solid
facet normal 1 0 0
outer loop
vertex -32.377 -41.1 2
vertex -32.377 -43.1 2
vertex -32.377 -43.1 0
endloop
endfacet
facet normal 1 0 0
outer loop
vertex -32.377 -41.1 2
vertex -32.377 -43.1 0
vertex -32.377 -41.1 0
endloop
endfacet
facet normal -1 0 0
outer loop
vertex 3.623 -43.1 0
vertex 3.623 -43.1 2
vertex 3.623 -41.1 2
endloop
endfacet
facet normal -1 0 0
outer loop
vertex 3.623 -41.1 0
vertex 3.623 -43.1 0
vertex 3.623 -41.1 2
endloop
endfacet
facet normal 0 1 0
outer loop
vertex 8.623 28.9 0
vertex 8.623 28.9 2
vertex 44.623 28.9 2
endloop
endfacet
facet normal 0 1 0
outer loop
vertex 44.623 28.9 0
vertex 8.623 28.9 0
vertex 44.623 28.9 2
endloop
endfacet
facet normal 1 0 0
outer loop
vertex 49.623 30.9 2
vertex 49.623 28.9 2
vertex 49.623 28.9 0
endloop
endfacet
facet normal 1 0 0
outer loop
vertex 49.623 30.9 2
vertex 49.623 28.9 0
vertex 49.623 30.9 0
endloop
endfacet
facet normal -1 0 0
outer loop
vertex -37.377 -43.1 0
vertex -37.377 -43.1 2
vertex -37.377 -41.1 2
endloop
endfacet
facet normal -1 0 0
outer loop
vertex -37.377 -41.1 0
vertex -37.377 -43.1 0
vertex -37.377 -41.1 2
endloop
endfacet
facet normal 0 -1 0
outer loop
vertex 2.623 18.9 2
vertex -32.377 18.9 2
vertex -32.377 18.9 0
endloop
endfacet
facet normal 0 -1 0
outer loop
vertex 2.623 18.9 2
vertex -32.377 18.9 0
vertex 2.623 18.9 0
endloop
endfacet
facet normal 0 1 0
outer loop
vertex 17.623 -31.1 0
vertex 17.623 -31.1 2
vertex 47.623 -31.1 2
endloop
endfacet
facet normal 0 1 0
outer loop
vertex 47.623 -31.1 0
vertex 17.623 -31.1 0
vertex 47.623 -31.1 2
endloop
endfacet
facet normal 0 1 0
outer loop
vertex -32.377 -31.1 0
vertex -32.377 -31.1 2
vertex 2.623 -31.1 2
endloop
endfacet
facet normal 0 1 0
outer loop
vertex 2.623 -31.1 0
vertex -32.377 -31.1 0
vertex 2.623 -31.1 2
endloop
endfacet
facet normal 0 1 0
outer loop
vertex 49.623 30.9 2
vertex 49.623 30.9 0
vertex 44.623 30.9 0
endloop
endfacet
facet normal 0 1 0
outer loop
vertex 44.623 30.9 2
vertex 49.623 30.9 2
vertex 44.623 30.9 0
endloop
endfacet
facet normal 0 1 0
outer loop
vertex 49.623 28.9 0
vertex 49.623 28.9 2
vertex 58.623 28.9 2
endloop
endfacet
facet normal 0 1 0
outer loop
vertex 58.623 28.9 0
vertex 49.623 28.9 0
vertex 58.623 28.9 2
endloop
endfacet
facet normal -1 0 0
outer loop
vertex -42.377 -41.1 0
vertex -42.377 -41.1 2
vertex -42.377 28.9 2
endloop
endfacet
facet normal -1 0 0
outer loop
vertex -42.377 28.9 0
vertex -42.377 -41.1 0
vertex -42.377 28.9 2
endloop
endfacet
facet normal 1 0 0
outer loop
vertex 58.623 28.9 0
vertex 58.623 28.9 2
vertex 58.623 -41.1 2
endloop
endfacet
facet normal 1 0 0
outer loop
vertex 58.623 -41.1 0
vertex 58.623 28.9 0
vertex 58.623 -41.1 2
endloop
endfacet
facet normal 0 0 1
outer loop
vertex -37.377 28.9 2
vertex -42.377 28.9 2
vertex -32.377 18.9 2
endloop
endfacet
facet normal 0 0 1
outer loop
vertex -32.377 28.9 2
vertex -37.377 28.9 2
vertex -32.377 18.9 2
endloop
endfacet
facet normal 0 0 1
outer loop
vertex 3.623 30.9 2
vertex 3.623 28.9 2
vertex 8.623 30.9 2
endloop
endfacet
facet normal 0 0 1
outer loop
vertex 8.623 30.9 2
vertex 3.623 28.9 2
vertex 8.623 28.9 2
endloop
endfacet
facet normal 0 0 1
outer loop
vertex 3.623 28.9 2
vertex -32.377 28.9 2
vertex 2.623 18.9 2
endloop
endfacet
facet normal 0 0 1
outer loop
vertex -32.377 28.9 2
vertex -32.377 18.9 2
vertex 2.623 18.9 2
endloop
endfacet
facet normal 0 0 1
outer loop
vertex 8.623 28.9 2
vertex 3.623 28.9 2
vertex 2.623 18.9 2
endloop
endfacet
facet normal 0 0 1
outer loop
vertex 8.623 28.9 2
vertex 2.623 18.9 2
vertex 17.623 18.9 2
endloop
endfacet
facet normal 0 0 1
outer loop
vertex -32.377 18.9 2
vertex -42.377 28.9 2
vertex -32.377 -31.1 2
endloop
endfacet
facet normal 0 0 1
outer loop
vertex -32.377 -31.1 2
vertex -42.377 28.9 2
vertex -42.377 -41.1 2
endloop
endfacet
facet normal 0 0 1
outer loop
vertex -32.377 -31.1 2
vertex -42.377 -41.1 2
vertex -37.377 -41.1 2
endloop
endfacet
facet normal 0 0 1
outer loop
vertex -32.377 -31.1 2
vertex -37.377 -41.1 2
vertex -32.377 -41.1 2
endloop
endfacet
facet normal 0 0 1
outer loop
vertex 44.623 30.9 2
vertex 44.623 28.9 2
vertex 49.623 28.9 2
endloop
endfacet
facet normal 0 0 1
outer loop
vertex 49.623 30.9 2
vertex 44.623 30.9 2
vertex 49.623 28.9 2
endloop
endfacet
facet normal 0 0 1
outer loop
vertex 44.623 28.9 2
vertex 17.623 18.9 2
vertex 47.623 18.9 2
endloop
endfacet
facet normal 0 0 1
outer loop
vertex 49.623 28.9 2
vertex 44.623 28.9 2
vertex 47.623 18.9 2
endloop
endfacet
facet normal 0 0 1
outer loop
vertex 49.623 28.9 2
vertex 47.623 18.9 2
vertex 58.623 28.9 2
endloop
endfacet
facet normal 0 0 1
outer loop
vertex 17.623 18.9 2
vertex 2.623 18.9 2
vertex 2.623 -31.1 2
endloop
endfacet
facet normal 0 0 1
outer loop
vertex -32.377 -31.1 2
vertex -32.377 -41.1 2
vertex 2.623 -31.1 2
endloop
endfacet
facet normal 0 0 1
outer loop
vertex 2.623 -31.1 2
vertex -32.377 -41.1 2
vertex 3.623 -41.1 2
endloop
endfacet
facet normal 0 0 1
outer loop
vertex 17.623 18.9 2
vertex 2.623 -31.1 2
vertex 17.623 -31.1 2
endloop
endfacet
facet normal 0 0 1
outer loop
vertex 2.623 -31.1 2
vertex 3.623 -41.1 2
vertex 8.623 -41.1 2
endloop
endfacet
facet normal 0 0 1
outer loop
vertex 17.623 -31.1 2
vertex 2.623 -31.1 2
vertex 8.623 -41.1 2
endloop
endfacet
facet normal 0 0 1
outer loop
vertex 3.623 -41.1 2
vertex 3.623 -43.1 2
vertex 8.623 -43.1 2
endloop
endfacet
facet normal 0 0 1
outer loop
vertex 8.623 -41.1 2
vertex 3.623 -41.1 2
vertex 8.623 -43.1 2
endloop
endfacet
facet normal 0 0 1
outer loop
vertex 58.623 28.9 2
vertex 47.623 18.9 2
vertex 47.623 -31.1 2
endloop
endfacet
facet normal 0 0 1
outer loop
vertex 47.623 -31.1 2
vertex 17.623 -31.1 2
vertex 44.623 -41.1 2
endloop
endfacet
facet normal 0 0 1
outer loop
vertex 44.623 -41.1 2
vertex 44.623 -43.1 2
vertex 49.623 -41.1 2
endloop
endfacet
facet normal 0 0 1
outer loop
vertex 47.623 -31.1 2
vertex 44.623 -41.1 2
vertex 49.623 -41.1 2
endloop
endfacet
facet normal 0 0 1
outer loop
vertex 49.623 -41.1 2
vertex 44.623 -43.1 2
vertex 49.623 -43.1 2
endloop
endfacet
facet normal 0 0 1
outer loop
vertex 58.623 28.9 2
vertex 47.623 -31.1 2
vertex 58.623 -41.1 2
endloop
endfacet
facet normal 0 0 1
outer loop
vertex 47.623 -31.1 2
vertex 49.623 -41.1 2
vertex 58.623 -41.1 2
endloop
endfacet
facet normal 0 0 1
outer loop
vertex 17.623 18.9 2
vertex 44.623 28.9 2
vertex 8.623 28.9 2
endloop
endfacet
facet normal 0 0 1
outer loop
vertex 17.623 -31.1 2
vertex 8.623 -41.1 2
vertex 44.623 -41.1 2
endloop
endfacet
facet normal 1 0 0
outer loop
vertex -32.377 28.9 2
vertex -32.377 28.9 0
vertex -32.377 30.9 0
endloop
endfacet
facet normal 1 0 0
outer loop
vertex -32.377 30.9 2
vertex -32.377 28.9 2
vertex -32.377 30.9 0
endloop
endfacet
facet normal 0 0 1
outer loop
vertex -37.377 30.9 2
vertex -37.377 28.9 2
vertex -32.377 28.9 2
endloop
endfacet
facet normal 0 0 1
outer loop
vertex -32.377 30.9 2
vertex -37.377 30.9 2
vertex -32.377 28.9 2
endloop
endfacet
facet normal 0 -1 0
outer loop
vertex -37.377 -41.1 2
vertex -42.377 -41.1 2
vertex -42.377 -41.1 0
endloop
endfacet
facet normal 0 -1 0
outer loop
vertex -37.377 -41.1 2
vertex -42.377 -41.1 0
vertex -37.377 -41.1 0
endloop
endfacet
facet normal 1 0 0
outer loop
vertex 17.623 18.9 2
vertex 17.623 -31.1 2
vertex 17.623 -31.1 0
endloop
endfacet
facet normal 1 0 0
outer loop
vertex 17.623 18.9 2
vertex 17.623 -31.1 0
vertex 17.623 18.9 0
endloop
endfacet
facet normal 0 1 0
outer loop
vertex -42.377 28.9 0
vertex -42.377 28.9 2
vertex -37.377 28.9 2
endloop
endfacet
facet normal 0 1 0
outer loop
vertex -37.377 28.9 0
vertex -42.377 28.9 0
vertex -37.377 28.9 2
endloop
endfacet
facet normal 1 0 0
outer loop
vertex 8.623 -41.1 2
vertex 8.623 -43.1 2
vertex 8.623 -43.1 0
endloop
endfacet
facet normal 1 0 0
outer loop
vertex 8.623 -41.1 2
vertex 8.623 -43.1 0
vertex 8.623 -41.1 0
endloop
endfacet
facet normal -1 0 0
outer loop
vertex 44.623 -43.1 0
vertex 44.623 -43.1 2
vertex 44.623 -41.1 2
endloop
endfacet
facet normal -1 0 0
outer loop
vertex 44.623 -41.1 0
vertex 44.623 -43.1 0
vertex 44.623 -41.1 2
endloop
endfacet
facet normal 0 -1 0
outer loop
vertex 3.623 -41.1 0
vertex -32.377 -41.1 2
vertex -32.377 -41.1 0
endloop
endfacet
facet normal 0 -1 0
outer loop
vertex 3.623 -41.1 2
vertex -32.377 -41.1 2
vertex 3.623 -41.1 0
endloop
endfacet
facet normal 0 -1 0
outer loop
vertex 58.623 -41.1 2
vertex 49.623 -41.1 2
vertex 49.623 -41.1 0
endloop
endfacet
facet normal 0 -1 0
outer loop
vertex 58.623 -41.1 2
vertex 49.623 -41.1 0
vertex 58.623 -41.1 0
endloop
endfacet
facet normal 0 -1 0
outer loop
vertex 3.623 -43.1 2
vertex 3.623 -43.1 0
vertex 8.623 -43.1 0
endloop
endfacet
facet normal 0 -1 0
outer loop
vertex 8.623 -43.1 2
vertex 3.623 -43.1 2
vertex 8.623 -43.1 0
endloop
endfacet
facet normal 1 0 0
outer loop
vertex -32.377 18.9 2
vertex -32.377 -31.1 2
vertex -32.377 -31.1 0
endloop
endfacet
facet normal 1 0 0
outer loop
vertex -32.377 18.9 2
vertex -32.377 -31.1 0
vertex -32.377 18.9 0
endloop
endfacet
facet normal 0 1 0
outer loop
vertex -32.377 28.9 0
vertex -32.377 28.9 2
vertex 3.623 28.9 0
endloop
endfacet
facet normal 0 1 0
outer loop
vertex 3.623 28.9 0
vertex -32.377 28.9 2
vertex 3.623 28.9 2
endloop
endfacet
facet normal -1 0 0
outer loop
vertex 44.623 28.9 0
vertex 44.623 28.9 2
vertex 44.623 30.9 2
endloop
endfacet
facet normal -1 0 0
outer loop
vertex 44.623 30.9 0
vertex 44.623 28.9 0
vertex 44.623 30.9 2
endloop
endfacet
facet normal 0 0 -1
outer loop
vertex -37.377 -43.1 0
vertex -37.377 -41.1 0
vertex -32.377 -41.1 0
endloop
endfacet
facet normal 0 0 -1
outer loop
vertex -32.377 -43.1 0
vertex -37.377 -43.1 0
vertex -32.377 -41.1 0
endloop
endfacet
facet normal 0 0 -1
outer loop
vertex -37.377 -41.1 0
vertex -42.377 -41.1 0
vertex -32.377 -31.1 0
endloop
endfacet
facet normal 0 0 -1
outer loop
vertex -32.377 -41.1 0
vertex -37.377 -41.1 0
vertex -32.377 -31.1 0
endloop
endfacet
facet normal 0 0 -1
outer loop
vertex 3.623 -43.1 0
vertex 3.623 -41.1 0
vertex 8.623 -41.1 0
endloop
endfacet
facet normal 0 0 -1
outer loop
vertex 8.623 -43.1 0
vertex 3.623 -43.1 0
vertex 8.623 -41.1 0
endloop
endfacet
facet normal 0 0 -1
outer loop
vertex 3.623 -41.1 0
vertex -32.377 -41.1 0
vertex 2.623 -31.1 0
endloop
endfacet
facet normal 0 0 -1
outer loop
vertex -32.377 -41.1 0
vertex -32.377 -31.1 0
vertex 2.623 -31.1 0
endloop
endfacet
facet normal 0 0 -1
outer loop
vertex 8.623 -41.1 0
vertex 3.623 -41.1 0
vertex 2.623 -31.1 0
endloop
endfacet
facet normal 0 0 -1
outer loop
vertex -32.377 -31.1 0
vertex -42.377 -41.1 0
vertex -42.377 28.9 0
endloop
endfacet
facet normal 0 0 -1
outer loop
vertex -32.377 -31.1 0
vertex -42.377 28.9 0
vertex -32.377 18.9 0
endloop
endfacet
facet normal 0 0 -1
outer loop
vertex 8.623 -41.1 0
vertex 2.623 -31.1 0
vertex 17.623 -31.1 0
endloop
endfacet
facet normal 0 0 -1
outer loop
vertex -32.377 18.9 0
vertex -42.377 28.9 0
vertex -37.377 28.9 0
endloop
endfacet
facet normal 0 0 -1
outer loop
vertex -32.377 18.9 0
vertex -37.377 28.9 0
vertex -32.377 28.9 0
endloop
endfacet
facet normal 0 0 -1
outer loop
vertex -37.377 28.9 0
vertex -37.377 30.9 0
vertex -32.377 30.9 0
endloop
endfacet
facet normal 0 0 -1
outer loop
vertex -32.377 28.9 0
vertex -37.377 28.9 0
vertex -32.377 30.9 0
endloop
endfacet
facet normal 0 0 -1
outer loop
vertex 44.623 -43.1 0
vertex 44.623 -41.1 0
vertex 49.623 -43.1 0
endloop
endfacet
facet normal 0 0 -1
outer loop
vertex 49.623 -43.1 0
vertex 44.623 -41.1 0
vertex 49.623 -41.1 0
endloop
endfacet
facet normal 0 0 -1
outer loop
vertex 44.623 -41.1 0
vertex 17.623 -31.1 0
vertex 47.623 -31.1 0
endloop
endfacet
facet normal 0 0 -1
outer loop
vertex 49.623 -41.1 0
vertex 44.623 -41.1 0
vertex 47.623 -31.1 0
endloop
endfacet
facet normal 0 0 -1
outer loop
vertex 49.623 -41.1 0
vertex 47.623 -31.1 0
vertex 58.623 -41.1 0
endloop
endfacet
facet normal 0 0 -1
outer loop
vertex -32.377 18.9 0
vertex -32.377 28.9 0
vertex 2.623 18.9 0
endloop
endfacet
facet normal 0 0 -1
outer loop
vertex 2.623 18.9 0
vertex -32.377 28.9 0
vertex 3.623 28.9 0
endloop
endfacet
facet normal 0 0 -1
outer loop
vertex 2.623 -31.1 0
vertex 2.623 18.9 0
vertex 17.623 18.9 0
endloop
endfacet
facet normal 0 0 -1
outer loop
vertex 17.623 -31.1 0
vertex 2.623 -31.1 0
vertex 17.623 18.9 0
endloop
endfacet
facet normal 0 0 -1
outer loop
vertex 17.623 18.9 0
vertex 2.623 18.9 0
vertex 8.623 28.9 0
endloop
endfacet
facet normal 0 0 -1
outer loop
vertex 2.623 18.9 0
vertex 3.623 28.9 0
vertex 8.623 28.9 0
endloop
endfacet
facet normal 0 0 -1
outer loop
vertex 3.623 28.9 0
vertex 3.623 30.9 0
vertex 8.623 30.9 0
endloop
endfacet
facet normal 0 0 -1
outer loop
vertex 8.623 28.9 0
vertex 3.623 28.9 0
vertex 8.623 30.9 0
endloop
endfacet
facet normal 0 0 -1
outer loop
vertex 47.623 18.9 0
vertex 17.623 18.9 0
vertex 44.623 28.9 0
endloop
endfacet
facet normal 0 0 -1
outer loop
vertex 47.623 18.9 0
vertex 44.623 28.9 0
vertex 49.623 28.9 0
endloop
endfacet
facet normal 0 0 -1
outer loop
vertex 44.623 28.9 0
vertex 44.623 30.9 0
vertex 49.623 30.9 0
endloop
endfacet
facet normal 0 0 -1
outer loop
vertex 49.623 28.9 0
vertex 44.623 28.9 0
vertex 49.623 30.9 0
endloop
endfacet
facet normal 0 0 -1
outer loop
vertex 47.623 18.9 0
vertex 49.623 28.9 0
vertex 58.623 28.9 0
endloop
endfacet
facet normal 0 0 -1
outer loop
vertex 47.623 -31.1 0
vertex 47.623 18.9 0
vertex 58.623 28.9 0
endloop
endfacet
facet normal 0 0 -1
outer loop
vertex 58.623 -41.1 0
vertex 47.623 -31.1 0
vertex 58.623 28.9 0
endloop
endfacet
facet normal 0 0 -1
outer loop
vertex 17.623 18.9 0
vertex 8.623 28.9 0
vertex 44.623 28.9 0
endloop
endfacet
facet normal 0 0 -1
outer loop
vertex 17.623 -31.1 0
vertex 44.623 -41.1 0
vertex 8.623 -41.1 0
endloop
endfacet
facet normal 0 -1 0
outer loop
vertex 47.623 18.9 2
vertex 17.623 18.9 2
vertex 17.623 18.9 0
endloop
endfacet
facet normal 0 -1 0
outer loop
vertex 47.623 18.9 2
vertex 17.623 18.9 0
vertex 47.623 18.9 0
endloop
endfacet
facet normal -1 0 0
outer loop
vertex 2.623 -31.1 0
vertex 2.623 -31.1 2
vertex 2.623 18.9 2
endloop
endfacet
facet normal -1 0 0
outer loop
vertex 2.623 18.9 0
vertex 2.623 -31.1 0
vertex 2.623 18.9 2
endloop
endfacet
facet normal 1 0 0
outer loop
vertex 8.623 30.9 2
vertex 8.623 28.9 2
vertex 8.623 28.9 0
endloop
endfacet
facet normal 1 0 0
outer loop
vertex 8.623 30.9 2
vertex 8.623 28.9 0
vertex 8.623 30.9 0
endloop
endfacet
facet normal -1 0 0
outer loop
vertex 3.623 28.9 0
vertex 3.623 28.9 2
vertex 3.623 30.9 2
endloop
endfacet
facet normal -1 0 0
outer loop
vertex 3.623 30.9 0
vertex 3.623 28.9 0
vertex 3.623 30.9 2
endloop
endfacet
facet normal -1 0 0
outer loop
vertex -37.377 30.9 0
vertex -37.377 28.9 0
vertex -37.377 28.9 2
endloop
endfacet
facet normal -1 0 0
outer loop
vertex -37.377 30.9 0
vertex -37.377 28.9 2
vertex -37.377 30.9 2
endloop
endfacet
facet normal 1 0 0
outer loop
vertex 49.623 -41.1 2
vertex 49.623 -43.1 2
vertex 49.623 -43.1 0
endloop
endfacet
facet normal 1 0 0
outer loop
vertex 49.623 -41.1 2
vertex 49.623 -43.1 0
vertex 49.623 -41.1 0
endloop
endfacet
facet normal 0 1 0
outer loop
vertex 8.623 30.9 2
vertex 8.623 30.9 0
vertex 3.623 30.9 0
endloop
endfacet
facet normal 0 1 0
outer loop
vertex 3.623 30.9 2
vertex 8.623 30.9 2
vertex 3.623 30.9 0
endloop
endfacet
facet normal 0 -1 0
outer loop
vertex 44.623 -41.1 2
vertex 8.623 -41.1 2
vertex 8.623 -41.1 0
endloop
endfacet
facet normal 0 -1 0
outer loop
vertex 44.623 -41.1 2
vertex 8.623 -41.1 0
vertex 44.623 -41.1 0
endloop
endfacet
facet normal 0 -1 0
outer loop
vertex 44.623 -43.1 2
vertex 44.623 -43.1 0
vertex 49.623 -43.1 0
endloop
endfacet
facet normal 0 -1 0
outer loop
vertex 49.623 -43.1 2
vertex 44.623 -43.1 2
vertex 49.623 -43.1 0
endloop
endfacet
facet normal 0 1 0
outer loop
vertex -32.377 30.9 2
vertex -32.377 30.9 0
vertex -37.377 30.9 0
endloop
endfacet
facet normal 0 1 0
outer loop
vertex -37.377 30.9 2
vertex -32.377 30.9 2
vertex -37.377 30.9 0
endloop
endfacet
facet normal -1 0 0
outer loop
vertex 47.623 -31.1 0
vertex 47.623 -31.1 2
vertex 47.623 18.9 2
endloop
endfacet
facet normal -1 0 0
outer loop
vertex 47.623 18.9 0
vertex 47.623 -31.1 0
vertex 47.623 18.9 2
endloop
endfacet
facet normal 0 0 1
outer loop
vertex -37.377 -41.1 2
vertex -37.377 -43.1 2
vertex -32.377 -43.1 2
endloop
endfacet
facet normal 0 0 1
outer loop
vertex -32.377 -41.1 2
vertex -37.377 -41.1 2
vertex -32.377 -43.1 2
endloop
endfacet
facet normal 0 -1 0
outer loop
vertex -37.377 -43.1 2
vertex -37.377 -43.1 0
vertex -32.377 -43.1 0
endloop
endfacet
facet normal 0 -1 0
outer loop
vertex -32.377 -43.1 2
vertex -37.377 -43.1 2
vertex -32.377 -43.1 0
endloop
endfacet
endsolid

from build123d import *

# Parameters (mm, degrees)
F0_W      = 101
F0_H      = 2
F1_DEPTH  = 12
F0_H_2    = 70
F2_DEPTH  = 2
F4_R      = 1.75
F5_DEPTH  = 100
F3_W      = 48
F3_H      = 12
F6_DEPTH  = 2
F7_W      = 35
F7_H      = 50
F7_W_2    = 30
F8_DEPTH  = 2
F9_W      = 5
F9_H      = 10
F10_DEPTH = 80
F11_DEPTH = 12


with BuildPart() as f1:
    # F0 (on Top) → F1 (new body)
    with BuildSketch(Plane.XY):
        Polygon((-42.3766899407, -41.0996641517), (-42.3766899407, 28.9003358483), (-42.3766899407, 30.9003358483), (-44.3766899407, 30.9003358483), (-44.3766899407, -43.0996641517), (-42.3766899407, -43.0996641517), align=None)
        with Locations((8.1233100593, 29.9003358483)):
            Rectangle(F0_W, F0_H)
        Polygon((58.6233100593, 30.9003358483), (58.6233100593, 28.9003358483), (58.6233100593, -41.0996641517), (58.6233100593, -43.0996641517), (60.6233100593, -43.0996641517), (60.6233100593, 30.9003358483), align=None)
        with Locations((8.1233100593, -42.0996641517)):
            Rectangle(F0_W, F0_H)
    extrude(amount=F1_DEPTH)

    # F0 (on Top) → F2 (join)
    with BuildSketch(Plane.XY):
        with Locations((8.1233100593, -6.0996641517)):
            Rectangle(F0_W, F0_H_2)
    extrude(amount=F2_DEPTH)

    # F4 (on face) → F5 (cut)
    with BuildSketch(Plane.XZ.offset(43.0996641517)):
        with Locations((44.6233227849, 5.0000082701)):
            Circle(F4_R)
        with Locations((-32.3766772151, 5.0000082701)):
            Circle(F4_R)
    extrude(amount=-F5_DEPTH, mode=Mode.SUBTRACT)

    # F3 (on face) → F6 (cut)
    with BuildSketch(Plane.YZ.offset(60.6233100593)):
        with Locations((-11.0996702909, 6)):
            Rectangle(F3_W, F3_H)
    extrude(amount=-F6_DEPTH, mode=Mode.SUBTRACT)

    # F7 (on face) → F8 (cut)
    with BuildSketch(Plane.XY.offset(2)):
        with Locations((-14.876691699, -6.0996547341)):
            Rectangle(F7_W, F7_H)
        with Locations((32.623308301, -6.0996547341)):
            Rectangle(F7_W_2, F7_H)
    extrude(amount=-F8_DEPTH, mode=Mode.SUBTRACT)

    # F9 (on face) → F10 (cut)
    with BuildSketch(Plane.XZ.offset(43.0996641517)):
        with Locations((-34.8767231405, 7.0000035018)):
            Rectangle(F9_W, F9_H)
        with Locations((6.1232769489, 7)):
            Rectangle(F9_W, F9_H)
        with Locations((47.1232769489, 7)):
            Rectangle(F9_W, F9_H)
    extrude(amount=-F10_DEPTH, mode=Mode.SUBTRACT)

    # F11 (cut): faces of the model
    f11_faces = [f1.faces().sort_by_distance(p)[0] for p in [
        (-14.3767230958, 29.9003358483, 12),
        (26.6232769489, 29.9003358483, 12),
        (49.8342274051, 29.9003358483, 12),
        (54.1232935041, -41.2356790884, 12),
        (26.6232769489, -42.0996641517, 12),
        (-14.3767230958, -42.0996641517, 12),
        (-42.9600276875, -6.0996641517, 12),
    ]]
    extrude(f11_faces, amount=-F11_DEPTH, mode=Mode.SUBTRACT)


solid = f1.part
